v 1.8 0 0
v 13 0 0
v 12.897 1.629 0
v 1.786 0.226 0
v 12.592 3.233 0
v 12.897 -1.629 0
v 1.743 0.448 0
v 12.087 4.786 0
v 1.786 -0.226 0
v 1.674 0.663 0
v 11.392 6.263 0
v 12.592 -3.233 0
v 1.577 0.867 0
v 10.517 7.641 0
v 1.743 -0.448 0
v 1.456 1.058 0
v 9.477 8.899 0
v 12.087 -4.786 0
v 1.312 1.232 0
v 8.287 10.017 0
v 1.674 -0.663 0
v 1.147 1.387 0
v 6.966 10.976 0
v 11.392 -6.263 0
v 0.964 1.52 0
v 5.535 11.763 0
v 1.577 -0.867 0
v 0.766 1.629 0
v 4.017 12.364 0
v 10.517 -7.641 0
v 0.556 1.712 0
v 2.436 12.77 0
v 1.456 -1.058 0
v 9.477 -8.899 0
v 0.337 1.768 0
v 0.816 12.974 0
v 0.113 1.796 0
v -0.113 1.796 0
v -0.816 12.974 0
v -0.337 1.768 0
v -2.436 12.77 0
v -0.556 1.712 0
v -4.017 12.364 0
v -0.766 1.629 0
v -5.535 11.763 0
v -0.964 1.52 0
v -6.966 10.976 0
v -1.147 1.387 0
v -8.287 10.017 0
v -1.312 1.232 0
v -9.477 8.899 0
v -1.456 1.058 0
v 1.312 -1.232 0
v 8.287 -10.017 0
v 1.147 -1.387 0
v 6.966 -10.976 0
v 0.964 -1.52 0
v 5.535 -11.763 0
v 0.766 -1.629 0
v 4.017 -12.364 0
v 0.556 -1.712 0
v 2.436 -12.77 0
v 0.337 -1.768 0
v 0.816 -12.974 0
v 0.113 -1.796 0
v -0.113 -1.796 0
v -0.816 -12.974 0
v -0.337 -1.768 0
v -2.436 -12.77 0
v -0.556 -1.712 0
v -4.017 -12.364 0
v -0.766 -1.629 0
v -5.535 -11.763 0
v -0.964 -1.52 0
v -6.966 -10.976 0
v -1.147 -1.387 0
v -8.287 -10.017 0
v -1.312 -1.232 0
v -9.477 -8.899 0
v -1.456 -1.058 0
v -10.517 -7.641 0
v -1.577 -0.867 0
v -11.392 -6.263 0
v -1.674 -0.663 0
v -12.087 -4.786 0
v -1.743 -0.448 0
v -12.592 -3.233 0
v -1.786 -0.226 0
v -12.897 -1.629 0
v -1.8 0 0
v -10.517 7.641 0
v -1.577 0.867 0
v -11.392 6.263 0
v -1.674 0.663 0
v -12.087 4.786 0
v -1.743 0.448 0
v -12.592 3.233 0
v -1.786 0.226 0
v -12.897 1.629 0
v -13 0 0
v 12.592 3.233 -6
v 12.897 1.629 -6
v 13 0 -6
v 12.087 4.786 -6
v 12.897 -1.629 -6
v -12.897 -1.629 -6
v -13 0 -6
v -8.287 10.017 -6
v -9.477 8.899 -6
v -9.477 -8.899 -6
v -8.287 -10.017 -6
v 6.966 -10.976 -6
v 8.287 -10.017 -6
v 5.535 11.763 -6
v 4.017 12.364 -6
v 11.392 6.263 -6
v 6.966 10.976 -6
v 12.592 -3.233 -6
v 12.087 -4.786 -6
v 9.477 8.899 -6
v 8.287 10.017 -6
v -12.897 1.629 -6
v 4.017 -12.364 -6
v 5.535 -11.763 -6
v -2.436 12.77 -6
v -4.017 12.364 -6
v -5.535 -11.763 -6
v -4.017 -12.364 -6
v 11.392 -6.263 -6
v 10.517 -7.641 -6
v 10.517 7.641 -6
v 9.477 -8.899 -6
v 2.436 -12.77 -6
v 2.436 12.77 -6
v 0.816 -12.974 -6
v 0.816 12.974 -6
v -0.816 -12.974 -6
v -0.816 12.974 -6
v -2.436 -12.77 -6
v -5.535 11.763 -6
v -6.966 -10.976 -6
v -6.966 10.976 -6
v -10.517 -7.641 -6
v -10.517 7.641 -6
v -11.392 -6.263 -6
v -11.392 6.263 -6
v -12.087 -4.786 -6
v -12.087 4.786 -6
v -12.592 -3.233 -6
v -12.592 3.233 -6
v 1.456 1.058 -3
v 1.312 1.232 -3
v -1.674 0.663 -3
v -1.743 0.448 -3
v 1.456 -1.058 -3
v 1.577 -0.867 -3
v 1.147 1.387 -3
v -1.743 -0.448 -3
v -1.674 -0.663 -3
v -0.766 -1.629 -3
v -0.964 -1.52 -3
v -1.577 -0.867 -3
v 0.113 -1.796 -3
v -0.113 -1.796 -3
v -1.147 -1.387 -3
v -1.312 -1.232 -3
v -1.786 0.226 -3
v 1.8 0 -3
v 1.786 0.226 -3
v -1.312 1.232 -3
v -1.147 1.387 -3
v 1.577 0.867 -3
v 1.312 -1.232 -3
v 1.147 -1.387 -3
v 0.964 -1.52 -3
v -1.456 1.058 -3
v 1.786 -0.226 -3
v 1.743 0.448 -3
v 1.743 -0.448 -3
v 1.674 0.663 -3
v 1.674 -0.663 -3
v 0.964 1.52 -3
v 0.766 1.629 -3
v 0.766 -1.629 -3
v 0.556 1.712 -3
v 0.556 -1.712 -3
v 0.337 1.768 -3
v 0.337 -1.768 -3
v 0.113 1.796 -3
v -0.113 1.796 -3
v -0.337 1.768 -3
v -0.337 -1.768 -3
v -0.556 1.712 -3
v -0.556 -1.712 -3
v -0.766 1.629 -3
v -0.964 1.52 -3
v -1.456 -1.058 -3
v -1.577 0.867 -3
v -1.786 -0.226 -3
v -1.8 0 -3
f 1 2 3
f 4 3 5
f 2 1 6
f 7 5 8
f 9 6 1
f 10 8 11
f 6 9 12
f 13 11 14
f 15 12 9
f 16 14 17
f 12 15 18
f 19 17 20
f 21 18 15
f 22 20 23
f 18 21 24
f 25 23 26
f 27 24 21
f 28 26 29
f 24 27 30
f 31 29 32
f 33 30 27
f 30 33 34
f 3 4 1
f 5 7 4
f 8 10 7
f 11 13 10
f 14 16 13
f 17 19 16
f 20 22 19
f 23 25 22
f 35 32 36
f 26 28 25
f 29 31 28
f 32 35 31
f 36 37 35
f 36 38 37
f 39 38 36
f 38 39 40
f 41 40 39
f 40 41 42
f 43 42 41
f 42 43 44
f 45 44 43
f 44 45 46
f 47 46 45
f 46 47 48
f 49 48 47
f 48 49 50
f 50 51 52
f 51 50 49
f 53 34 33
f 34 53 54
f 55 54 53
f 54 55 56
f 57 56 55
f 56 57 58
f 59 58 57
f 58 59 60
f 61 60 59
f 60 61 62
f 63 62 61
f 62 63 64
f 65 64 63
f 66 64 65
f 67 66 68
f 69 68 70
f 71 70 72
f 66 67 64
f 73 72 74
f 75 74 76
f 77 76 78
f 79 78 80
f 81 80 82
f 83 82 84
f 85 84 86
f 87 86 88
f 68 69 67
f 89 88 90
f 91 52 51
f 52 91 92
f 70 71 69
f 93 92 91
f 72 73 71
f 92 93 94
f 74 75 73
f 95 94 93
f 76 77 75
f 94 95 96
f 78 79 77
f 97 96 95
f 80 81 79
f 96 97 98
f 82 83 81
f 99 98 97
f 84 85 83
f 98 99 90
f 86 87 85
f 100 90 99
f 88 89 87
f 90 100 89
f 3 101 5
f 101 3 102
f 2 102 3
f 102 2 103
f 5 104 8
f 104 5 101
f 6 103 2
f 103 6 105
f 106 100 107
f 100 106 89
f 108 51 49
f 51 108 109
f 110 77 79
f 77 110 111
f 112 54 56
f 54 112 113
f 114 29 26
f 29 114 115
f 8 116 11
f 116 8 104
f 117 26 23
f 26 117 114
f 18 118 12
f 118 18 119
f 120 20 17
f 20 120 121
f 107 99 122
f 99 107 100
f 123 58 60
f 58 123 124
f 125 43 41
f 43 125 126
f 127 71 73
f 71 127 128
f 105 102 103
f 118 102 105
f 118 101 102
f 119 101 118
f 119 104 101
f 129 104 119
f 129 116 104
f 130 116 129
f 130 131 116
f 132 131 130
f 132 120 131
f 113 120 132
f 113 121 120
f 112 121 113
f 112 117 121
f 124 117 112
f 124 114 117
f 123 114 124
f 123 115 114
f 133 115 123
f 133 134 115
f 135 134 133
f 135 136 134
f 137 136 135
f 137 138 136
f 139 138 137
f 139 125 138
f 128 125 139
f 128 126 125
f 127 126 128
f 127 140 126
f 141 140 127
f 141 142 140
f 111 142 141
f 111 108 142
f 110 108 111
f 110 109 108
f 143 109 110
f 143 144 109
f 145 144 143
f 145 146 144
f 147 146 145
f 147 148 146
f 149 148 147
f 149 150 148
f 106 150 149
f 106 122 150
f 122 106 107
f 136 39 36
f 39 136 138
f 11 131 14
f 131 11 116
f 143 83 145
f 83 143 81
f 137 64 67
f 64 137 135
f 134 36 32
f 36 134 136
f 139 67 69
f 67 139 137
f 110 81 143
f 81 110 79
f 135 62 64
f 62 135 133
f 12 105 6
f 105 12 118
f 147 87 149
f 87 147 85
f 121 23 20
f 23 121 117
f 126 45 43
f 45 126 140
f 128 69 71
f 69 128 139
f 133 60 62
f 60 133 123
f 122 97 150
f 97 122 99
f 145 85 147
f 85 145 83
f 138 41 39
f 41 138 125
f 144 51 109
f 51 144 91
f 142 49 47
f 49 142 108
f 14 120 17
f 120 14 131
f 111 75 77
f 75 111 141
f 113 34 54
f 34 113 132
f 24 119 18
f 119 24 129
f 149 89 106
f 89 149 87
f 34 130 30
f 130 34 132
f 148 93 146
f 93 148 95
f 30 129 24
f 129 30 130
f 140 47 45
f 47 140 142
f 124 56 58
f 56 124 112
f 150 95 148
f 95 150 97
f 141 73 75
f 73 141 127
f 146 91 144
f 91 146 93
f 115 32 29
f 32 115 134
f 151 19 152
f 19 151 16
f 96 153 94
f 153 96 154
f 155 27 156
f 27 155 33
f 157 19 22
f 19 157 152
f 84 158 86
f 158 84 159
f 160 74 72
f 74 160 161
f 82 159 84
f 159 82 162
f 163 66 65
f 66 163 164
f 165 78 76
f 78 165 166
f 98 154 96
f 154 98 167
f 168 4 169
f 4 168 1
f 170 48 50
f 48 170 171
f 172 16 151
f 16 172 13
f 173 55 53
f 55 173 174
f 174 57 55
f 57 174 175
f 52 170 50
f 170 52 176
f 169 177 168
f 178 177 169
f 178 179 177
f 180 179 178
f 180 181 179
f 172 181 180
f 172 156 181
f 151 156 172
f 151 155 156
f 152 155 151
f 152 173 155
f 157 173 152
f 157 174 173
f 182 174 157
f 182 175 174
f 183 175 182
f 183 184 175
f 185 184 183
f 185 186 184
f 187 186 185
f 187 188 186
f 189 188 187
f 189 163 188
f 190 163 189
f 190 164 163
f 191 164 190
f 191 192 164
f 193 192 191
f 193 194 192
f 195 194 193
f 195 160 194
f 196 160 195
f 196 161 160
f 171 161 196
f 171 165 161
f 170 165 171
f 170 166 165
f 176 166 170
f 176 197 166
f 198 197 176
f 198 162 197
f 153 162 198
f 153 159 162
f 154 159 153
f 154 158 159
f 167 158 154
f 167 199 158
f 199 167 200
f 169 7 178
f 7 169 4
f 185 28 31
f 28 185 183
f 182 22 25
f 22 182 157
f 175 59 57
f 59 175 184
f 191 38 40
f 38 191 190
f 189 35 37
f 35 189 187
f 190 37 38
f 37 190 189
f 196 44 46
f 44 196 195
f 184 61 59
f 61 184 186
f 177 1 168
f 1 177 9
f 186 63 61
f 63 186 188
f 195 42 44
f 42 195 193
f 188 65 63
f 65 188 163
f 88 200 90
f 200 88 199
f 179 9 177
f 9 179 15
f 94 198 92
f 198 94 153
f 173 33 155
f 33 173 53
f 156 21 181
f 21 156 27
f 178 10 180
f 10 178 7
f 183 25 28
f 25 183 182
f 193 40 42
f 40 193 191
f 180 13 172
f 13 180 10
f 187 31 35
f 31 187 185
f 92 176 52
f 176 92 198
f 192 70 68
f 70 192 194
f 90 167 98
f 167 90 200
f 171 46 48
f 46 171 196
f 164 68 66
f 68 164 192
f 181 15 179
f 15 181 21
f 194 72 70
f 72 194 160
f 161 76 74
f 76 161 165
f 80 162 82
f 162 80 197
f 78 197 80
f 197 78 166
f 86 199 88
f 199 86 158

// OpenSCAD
$fn = 50;


difference() {
	union() {
		translate(v = [0, 0, -3.0000000000]) {
			cylinder(h = 3, r = 10.0000000000);
		}
		translate(v = [0, 0, -6.0000000000]) {
			cylinder(h = 6, r = 13.0000000000);
		}
	}
	union() {
		#translate(v = [0, 0, -3]) {
			cylinder(h = 3, r = 1.8000000000);
		}
	}
}
